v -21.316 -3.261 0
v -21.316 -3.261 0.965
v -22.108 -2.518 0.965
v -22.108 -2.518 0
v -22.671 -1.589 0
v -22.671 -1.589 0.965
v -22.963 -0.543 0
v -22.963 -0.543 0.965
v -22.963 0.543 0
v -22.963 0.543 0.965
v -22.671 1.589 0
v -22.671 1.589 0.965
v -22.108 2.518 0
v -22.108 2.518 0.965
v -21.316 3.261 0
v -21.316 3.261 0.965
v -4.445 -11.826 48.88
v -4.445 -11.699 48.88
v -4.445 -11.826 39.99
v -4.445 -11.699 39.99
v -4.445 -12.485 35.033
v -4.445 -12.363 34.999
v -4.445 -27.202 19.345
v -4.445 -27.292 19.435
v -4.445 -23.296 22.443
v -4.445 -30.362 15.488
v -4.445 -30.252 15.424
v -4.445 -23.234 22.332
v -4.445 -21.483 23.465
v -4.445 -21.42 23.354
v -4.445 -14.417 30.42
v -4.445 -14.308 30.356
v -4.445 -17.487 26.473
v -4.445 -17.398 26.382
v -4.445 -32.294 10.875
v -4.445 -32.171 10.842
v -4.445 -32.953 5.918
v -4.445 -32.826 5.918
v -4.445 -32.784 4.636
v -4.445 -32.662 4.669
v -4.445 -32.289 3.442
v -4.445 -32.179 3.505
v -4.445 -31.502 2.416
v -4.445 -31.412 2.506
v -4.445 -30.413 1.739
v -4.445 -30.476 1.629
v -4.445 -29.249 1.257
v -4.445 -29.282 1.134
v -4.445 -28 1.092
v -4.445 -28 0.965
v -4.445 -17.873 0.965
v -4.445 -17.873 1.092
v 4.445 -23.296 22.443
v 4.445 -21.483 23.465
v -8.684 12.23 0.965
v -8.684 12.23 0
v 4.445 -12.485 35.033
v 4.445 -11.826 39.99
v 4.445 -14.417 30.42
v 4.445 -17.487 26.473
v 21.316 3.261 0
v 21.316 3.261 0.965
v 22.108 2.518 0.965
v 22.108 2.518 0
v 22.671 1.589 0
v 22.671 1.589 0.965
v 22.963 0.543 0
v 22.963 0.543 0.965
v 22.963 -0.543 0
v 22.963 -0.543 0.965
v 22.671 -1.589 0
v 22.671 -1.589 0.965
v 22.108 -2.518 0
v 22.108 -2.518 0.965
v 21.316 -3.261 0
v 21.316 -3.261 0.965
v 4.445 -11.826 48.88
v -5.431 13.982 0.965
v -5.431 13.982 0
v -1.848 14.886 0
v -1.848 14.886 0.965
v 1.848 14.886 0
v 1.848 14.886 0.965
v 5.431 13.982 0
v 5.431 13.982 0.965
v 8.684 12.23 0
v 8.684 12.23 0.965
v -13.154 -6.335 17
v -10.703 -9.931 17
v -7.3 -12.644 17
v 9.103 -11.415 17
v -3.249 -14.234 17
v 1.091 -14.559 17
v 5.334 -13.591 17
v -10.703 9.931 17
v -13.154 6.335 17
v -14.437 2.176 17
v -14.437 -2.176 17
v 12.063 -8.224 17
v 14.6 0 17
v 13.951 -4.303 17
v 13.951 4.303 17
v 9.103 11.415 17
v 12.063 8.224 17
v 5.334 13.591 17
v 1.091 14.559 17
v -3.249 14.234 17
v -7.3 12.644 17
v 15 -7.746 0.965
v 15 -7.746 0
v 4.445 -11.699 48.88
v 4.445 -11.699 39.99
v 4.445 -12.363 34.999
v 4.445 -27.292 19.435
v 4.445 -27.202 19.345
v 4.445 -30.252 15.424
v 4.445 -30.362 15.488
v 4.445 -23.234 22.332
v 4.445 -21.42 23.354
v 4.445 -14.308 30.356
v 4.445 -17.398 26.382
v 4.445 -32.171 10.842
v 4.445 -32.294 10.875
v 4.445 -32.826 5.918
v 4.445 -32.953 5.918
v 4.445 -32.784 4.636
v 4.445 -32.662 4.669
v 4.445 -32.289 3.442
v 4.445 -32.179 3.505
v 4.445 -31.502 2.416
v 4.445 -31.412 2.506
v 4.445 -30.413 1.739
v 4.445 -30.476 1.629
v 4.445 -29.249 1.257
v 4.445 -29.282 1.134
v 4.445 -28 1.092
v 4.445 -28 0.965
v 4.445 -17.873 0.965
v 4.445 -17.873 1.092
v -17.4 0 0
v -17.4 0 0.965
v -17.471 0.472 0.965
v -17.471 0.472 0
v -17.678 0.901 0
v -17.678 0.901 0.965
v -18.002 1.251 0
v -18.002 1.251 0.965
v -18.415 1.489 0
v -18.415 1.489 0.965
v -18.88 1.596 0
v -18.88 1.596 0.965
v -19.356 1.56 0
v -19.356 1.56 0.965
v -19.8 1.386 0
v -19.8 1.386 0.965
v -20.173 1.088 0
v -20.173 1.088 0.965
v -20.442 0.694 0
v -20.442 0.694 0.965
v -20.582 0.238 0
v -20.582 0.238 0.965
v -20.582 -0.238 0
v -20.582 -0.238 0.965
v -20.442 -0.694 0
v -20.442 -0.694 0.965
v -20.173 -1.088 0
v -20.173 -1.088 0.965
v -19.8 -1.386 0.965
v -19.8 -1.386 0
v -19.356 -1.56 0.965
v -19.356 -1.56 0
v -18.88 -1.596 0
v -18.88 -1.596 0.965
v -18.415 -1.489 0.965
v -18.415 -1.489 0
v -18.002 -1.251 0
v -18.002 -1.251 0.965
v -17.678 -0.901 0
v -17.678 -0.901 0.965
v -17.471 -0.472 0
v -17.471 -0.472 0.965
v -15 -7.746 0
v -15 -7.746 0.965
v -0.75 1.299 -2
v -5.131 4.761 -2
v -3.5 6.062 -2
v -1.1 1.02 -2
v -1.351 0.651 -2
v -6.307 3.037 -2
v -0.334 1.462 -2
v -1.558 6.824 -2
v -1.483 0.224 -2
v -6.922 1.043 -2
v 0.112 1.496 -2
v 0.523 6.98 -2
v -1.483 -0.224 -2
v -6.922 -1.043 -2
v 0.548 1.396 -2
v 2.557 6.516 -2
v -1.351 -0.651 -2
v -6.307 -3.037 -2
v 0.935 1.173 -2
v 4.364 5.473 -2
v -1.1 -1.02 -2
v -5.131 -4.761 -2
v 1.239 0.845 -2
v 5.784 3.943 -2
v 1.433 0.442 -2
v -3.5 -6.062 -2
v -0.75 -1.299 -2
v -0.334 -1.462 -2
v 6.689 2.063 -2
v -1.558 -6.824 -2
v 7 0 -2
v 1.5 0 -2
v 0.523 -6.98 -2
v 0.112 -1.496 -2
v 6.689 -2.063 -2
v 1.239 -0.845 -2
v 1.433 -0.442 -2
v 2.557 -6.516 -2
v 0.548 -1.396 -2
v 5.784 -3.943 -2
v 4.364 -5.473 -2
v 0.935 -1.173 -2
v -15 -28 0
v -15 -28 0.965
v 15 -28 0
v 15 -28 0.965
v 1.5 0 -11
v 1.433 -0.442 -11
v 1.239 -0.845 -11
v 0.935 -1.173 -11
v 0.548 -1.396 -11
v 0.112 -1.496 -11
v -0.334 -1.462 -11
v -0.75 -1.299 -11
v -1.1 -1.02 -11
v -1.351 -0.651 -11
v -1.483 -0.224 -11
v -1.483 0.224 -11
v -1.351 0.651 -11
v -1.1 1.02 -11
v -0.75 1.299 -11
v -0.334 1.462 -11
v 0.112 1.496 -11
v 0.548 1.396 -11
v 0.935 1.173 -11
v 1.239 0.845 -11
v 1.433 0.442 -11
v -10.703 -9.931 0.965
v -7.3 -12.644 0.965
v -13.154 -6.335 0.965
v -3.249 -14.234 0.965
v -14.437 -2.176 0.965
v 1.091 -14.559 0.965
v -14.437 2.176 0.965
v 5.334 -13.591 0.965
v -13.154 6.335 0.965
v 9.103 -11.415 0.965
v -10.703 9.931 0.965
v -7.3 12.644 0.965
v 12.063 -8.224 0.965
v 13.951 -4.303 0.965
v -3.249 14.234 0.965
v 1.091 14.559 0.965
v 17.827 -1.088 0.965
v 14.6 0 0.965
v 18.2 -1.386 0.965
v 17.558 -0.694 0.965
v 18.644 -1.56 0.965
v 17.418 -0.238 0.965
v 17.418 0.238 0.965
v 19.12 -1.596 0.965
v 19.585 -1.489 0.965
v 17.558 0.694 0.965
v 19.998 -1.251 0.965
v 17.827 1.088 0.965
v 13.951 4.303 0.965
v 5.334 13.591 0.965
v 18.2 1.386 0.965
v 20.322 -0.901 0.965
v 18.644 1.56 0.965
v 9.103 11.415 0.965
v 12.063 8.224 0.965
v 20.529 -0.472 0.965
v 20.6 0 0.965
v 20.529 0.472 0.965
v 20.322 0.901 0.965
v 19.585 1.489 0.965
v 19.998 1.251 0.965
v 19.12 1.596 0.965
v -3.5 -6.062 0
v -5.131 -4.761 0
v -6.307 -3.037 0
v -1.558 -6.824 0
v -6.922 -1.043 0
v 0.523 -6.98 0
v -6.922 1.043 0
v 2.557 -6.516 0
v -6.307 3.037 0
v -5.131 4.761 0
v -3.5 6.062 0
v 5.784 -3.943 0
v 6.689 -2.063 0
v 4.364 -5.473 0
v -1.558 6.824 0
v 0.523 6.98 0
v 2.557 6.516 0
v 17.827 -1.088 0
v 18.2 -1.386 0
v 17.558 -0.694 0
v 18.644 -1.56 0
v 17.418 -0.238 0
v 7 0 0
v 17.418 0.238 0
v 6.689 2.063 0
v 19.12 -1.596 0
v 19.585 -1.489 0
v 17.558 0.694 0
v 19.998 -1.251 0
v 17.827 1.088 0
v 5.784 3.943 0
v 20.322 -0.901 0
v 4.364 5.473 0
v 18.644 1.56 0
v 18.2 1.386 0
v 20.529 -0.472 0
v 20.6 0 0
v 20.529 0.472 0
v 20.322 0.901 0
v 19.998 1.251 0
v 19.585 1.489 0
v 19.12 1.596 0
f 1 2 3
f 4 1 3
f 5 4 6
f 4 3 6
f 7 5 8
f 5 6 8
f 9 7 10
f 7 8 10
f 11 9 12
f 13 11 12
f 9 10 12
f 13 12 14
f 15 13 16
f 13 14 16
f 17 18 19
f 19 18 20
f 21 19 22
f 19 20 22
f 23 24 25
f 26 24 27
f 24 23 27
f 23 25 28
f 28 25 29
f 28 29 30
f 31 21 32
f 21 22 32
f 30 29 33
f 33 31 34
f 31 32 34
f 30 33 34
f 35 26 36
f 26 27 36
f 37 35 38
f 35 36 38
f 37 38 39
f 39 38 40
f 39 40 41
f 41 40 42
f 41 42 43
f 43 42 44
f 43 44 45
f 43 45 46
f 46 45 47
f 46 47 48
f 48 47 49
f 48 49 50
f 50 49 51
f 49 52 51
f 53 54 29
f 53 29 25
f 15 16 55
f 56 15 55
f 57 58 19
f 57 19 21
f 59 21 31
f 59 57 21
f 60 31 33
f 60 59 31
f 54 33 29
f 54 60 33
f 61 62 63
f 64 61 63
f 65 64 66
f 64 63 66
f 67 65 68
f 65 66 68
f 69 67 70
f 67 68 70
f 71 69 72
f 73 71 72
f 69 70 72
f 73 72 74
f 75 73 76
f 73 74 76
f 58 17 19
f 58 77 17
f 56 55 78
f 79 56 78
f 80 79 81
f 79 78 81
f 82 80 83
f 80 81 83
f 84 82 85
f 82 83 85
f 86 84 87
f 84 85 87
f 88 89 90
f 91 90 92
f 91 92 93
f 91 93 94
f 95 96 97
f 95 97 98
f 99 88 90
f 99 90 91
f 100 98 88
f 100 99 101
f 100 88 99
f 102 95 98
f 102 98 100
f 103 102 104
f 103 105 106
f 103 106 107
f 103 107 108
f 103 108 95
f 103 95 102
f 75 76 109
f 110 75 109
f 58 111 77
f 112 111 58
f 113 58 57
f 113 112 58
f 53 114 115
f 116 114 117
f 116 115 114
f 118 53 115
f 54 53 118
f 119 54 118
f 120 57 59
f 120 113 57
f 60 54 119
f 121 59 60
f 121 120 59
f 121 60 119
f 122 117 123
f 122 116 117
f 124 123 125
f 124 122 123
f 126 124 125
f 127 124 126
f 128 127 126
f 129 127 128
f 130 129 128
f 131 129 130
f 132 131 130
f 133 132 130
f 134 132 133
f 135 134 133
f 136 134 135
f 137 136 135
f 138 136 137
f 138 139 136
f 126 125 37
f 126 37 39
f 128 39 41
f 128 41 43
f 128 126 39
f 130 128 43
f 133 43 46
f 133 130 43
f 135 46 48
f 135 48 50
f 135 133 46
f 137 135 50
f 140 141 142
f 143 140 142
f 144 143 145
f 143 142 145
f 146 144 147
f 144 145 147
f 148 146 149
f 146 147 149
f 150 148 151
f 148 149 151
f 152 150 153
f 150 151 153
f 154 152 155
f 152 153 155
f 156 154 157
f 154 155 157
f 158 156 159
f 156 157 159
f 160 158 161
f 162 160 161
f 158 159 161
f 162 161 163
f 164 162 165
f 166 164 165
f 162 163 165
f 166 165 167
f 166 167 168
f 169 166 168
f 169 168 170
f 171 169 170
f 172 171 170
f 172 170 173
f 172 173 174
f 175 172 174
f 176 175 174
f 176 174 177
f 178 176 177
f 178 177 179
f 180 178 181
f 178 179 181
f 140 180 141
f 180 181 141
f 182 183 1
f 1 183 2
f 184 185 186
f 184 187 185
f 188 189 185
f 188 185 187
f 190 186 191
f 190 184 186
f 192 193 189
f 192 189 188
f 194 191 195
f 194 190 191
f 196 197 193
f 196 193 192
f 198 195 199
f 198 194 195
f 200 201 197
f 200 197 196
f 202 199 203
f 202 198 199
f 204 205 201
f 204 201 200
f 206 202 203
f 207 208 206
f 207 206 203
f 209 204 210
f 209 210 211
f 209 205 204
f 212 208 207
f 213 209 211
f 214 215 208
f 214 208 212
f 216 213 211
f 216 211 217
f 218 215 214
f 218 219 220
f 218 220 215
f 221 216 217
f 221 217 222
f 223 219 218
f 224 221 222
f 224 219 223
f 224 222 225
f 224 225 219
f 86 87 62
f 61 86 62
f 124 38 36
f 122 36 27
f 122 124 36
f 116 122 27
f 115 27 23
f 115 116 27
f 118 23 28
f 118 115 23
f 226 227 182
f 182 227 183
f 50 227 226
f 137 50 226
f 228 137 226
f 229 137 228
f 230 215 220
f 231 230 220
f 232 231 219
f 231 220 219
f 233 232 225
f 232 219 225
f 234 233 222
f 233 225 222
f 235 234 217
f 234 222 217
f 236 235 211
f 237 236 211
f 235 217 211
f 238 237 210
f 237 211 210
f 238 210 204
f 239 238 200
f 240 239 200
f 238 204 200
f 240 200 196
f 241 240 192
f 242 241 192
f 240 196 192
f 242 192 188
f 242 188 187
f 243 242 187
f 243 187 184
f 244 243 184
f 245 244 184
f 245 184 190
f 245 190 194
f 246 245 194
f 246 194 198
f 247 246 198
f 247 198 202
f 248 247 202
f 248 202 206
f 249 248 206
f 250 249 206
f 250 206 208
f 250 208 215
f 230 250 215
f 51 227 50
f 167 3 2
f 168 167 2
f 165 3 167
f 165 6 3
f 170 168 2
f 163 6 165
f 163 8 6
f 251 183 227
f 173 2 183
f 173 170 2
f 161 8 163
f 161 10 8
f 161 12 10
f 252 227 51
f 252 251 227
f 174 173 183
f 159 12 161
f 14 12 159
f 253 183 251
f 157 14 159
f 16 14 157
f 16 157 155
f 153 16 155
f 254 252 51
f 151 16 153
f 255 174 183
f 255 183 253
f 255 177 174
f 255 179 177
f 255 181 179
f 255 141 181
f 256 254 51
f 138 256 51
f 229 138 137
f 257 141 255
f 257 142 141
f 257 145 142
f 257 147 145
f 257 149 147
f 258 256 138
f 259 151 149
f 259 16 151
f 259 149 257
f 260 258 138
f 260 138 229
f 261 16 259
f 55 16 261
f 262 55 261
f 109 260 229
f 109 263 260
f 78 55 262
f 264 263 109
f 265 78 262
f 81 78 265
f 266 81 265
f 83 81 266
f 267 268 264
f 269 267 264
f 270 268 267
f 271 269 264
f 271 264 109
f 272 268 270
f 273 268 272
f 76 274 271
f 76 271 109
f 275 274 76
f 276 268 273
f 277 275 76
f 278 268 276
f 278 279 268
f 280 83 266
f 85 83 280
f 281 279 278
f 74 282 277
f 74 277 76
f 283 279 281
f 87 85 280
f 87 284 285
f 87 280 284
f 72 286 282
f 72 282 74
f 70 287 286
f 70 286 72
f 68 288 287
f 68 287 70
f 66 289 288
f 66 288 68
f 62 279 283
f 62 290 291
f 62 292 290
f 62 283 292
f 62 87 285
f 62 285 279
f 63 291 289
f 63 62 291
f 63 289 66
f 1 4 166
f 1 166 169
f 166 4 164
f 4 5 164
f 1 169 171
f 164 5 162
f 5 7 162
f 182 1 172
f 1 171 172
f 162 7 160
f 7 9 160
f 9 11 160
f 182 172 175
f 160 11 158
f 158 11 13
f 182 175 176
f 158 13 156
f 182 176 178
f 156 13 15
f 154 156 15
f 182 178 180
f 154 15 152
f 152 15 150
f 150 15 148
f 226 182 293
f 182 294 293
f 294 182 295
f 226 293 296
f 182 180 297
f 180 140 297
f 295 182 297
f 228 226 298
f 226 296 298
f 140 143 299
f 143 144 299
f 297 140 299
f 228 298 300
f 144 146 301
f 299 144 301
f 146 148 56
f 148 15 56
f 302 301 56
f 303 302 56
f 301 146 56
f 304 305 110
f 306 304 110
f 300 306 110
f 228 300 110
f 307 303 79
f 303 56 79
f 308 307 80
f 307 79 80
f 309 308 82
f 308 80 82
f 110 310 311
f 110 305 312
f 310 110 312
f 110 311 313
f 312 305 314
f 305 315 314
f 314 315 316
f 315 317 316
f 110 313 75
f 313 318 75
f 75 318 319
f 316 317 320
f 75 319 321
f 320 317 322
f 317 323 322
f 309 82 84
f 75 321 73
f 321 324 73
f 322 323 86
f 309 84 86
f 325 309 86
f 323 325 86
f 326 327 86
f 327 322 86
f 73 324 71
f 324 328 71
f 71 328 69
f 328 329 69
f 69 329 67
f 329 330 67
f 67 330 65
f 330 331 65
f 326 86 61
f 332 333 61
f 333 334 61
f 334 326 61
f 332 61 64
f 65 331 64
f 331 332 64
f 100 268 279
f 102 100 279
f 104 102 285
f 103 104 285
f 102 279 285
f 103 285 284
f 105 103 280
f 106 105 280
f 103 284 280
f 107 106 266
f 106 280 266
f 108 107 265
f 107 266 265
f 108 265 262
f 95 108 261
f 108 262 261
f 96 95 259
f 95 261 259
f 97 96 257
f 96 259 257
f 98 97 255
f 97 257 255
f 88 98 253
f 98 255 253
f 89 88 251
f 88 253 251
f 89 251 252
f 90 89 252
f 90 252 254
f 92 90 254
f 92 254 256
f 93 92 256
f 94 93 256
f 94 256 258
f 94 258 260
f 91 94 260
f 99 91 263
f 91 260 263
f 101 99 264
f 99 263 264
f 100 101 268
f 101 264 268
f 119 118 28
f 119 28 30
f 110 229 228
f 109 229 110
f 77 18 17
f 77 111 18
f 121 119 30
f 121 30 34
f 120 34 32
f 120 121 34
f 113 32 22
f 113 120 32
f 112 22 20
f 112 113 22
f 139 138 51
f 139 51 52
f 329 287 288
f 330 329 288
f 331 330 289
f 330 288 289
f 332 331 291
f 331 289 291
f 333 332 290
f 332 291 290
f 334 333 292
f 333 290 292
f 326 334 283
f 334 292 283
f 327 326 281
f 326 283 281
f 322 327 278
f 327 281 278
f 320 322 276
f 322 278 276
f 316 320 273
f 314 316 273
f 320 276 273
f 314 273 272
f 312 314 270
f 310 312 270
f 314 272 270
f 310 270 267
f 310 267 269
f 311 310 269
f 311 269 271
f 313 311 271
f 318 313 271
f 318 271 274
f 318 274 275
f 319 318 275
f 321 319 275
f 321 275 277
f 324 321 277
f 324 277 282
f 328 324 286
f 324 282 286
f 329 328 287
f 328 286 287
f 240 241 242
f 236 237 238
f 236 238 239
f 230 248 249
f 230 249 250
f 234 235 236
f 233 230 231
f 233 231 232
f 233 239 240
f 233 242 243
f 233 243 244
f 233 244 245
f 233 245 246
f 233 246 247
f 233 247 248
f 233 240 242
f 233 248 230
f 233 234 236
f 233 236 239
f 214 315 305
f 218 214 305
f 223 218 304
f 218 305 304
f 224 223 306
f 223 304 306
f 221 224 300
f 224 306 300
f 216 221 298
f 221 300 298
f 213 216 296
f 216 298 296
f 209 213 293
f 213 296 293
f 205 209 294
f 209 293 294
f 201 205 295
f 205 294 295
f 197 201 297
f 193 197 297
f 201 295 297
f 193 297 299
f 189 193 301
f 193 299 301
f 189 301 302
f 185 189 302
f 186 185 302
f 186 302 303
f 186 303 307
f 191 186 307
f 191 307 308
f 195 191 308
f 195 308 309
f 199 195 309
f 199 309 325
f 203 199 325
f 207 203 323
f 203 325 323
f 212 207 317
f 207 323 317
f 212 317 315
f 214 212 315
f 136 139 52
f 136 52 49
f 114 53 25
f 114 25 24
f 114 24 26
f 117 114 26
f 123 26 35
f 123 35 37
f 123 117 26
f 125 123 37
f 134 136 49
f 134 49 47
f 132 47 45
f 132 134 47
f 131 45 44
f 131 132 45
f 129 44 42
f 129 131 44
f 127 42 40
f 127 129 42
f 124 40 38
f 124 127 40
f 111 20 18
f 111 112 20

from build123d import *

# Parameters (mm, degrees)
SKETCH1_R           = 15
BOSS_EXTRUDE1_DEPTH = 0.9652
SKETCH2_R           = 1.6
BOSS_EXTRUDE2_DEPTH = 0.9652
SKETCH3_W           = 30
SKETCH3_H           = 26
BOSS_EXTRUDE3_DEPTH = 0.9652
SKETCH4_R           = 14.6
BOSS_EXTRUDE4_DEPTH = 16.0348
SKETCH5_R           = 1.5
BOSS_EXTRUDE5_DEPTH = 11
SKETCH6_R           = 7
BOSS_EXTRUDE6_DEPTH = 2
BOSS_EXTRUDE7_DEPTH = 4.445


with BuildPart() as part:
    # Sketch1 → Boss-Extrude1 (new body)
    with BuildSketch(Plane.XY):
        with Locations(Location((0, 0, 0), (0, 0, 180))):
            Circle(SKETCH1_R)
    extrude(amount=BOSS_EXTRUDE1_DEPTH)

    # Sketch2 → Boss-Extrude2 (add, through all)
    with BuildSketch(Plane.XY.offset(0.9652)):
        with BuildLine():
            Line((-21.315789474, 3.26145966), (-8.684210526, 12.230473725))
            ThreePointArc((-8.684210526, 12.230473725), (0, 15), (8.684210526, 12.230473725))
            Line((8.684210526, 12.230473725), (21.315789474, 3.26145966))
            ThreePointArc((21.315789474, 3.26145966), (23, 0), (21.315789474, -3.26145966))
            Line((21.315789474, -3.26145966), (8.684210526, -12.230473725))
            ThreePointArc((8.684210526, -12.230473725), (0, -15), (-8.684210526, -12.230473725))
            Line((-8.684210526, -12.230473725), (-21.315789474, -3.26145966))
            ThreePointArc((-21.315789474, -3.26145966), (-23, 0), (-21.315789474, 3.26145966))
        make_face()
        with Locations((-19, 0)):
            Circle(SKETCH2_R, mode=Mode.SUBTRACT)
        with Locations((19, 0)):
            Circle(SKETCH2_R, mode=Mode.SUBTRACT)
    extrude(amount=-BOSS_EXTRUDE2_DEPTH)

    # Sketch3 → Boss-Extrude3 (add, through all)
    with BuildSketch(Plane.XY.offset(0.9652)):
        with Locations((0, -15)):
            Rectangle(SKETCH3_W, SKETCH3_H)
    extrude(amount=-BOSS_EXTRUDE3_DEPTH)

    # Sketch4 → Boss-Extrude4 (add)
    with BuildSketch(Plane.XY.offset(0.9652)):
        Circle(SKETCH4_R)
    extrude(amount=BOSS_EXTRUDE4_DEPTH)

    # Sketch5 → Boss-Extrude5 (add)
    with BuildSketch(Plane(origin=(0, 0, 0), x_dir=(-1, 0, 0), z_dir=(0, 0, -1))):
        with Locations(Location((0, 0, 0), (0, 0, 180))):
            Circle(SKETCH5_R)
    extrude(amount=BOSS_EXTRUDE5_DEPTH)

    # Sketch6 → Boss-Extrude6 (add)
    with BuildSketch(Plane(origin=(0, 0, 0), x_dir=(-1, 0, 0), z_dir=(0, 0, -1))):
        with Locations(Location((0, 0, 0), (0, 0, 180))):
            Circle(SKETCH6_R)
    extrude(amount=BOSS_EXTRUDE6_DEPTH)

    # Sketch7 → Boss-Extrude7 (add, symmetric)
    with BuildSketch(Plane(origin=(0, 0, 0), x_dir=(0, 0, -1), z_dir=(1, 0, 0))):
        with BuildLine():
            Line((-48.879875, -11.826), (-39.989875, -11.826))
            ThreePointArc((-39.989875, -11.826), (-30.420049501, -14.417177809), (-23.46493471, -21.482737995))
            Line((-23.46493471, -21.482737995), (-22.44314029, -23.296262005))
            ThreePointArc((-22.44314029, -23.296262005), (-15.488025499, -30.361822191), (-5.9182, -32.953))
            ThreePointArc((-5.9182, -32.953), (-2.415900113, -31.502299887), (-0.9652, -28))
            Line((-0.9652, -28), (-0.9652, -17.872983346))
            Line((-0.9652, -17.872983346), (-1.0922, -17.872983346))
            Line((-1.0922, -17.872983346), (-1.0922, -28))
            ThreePointArc((-1.0922, -28), (-2.505702674, -31.412497326), (-5.9182, -32.826))
            ThreePointArc((-5.9182, -32.826), (-15.423948796, -30.252171946), (-22.332494209, -23.233920647))
            Line((-22.332494209, -23.233920647), (-23.35428863, -21.420396638))
            ThreePointArc((-23.35428863, -21.420396638), (-30.355972799, -14.307527564), (-39.989875, -11.699))
            Line((-39.989875, -11.699), (-48.879875, -11.699))
            Line((-48.879875, -11.699), (-48.879875, -11.826))
        make_face()
    extrude(amount=BOSS_EXTRUDE7_DEPTH, both=True)


solid = part.part
